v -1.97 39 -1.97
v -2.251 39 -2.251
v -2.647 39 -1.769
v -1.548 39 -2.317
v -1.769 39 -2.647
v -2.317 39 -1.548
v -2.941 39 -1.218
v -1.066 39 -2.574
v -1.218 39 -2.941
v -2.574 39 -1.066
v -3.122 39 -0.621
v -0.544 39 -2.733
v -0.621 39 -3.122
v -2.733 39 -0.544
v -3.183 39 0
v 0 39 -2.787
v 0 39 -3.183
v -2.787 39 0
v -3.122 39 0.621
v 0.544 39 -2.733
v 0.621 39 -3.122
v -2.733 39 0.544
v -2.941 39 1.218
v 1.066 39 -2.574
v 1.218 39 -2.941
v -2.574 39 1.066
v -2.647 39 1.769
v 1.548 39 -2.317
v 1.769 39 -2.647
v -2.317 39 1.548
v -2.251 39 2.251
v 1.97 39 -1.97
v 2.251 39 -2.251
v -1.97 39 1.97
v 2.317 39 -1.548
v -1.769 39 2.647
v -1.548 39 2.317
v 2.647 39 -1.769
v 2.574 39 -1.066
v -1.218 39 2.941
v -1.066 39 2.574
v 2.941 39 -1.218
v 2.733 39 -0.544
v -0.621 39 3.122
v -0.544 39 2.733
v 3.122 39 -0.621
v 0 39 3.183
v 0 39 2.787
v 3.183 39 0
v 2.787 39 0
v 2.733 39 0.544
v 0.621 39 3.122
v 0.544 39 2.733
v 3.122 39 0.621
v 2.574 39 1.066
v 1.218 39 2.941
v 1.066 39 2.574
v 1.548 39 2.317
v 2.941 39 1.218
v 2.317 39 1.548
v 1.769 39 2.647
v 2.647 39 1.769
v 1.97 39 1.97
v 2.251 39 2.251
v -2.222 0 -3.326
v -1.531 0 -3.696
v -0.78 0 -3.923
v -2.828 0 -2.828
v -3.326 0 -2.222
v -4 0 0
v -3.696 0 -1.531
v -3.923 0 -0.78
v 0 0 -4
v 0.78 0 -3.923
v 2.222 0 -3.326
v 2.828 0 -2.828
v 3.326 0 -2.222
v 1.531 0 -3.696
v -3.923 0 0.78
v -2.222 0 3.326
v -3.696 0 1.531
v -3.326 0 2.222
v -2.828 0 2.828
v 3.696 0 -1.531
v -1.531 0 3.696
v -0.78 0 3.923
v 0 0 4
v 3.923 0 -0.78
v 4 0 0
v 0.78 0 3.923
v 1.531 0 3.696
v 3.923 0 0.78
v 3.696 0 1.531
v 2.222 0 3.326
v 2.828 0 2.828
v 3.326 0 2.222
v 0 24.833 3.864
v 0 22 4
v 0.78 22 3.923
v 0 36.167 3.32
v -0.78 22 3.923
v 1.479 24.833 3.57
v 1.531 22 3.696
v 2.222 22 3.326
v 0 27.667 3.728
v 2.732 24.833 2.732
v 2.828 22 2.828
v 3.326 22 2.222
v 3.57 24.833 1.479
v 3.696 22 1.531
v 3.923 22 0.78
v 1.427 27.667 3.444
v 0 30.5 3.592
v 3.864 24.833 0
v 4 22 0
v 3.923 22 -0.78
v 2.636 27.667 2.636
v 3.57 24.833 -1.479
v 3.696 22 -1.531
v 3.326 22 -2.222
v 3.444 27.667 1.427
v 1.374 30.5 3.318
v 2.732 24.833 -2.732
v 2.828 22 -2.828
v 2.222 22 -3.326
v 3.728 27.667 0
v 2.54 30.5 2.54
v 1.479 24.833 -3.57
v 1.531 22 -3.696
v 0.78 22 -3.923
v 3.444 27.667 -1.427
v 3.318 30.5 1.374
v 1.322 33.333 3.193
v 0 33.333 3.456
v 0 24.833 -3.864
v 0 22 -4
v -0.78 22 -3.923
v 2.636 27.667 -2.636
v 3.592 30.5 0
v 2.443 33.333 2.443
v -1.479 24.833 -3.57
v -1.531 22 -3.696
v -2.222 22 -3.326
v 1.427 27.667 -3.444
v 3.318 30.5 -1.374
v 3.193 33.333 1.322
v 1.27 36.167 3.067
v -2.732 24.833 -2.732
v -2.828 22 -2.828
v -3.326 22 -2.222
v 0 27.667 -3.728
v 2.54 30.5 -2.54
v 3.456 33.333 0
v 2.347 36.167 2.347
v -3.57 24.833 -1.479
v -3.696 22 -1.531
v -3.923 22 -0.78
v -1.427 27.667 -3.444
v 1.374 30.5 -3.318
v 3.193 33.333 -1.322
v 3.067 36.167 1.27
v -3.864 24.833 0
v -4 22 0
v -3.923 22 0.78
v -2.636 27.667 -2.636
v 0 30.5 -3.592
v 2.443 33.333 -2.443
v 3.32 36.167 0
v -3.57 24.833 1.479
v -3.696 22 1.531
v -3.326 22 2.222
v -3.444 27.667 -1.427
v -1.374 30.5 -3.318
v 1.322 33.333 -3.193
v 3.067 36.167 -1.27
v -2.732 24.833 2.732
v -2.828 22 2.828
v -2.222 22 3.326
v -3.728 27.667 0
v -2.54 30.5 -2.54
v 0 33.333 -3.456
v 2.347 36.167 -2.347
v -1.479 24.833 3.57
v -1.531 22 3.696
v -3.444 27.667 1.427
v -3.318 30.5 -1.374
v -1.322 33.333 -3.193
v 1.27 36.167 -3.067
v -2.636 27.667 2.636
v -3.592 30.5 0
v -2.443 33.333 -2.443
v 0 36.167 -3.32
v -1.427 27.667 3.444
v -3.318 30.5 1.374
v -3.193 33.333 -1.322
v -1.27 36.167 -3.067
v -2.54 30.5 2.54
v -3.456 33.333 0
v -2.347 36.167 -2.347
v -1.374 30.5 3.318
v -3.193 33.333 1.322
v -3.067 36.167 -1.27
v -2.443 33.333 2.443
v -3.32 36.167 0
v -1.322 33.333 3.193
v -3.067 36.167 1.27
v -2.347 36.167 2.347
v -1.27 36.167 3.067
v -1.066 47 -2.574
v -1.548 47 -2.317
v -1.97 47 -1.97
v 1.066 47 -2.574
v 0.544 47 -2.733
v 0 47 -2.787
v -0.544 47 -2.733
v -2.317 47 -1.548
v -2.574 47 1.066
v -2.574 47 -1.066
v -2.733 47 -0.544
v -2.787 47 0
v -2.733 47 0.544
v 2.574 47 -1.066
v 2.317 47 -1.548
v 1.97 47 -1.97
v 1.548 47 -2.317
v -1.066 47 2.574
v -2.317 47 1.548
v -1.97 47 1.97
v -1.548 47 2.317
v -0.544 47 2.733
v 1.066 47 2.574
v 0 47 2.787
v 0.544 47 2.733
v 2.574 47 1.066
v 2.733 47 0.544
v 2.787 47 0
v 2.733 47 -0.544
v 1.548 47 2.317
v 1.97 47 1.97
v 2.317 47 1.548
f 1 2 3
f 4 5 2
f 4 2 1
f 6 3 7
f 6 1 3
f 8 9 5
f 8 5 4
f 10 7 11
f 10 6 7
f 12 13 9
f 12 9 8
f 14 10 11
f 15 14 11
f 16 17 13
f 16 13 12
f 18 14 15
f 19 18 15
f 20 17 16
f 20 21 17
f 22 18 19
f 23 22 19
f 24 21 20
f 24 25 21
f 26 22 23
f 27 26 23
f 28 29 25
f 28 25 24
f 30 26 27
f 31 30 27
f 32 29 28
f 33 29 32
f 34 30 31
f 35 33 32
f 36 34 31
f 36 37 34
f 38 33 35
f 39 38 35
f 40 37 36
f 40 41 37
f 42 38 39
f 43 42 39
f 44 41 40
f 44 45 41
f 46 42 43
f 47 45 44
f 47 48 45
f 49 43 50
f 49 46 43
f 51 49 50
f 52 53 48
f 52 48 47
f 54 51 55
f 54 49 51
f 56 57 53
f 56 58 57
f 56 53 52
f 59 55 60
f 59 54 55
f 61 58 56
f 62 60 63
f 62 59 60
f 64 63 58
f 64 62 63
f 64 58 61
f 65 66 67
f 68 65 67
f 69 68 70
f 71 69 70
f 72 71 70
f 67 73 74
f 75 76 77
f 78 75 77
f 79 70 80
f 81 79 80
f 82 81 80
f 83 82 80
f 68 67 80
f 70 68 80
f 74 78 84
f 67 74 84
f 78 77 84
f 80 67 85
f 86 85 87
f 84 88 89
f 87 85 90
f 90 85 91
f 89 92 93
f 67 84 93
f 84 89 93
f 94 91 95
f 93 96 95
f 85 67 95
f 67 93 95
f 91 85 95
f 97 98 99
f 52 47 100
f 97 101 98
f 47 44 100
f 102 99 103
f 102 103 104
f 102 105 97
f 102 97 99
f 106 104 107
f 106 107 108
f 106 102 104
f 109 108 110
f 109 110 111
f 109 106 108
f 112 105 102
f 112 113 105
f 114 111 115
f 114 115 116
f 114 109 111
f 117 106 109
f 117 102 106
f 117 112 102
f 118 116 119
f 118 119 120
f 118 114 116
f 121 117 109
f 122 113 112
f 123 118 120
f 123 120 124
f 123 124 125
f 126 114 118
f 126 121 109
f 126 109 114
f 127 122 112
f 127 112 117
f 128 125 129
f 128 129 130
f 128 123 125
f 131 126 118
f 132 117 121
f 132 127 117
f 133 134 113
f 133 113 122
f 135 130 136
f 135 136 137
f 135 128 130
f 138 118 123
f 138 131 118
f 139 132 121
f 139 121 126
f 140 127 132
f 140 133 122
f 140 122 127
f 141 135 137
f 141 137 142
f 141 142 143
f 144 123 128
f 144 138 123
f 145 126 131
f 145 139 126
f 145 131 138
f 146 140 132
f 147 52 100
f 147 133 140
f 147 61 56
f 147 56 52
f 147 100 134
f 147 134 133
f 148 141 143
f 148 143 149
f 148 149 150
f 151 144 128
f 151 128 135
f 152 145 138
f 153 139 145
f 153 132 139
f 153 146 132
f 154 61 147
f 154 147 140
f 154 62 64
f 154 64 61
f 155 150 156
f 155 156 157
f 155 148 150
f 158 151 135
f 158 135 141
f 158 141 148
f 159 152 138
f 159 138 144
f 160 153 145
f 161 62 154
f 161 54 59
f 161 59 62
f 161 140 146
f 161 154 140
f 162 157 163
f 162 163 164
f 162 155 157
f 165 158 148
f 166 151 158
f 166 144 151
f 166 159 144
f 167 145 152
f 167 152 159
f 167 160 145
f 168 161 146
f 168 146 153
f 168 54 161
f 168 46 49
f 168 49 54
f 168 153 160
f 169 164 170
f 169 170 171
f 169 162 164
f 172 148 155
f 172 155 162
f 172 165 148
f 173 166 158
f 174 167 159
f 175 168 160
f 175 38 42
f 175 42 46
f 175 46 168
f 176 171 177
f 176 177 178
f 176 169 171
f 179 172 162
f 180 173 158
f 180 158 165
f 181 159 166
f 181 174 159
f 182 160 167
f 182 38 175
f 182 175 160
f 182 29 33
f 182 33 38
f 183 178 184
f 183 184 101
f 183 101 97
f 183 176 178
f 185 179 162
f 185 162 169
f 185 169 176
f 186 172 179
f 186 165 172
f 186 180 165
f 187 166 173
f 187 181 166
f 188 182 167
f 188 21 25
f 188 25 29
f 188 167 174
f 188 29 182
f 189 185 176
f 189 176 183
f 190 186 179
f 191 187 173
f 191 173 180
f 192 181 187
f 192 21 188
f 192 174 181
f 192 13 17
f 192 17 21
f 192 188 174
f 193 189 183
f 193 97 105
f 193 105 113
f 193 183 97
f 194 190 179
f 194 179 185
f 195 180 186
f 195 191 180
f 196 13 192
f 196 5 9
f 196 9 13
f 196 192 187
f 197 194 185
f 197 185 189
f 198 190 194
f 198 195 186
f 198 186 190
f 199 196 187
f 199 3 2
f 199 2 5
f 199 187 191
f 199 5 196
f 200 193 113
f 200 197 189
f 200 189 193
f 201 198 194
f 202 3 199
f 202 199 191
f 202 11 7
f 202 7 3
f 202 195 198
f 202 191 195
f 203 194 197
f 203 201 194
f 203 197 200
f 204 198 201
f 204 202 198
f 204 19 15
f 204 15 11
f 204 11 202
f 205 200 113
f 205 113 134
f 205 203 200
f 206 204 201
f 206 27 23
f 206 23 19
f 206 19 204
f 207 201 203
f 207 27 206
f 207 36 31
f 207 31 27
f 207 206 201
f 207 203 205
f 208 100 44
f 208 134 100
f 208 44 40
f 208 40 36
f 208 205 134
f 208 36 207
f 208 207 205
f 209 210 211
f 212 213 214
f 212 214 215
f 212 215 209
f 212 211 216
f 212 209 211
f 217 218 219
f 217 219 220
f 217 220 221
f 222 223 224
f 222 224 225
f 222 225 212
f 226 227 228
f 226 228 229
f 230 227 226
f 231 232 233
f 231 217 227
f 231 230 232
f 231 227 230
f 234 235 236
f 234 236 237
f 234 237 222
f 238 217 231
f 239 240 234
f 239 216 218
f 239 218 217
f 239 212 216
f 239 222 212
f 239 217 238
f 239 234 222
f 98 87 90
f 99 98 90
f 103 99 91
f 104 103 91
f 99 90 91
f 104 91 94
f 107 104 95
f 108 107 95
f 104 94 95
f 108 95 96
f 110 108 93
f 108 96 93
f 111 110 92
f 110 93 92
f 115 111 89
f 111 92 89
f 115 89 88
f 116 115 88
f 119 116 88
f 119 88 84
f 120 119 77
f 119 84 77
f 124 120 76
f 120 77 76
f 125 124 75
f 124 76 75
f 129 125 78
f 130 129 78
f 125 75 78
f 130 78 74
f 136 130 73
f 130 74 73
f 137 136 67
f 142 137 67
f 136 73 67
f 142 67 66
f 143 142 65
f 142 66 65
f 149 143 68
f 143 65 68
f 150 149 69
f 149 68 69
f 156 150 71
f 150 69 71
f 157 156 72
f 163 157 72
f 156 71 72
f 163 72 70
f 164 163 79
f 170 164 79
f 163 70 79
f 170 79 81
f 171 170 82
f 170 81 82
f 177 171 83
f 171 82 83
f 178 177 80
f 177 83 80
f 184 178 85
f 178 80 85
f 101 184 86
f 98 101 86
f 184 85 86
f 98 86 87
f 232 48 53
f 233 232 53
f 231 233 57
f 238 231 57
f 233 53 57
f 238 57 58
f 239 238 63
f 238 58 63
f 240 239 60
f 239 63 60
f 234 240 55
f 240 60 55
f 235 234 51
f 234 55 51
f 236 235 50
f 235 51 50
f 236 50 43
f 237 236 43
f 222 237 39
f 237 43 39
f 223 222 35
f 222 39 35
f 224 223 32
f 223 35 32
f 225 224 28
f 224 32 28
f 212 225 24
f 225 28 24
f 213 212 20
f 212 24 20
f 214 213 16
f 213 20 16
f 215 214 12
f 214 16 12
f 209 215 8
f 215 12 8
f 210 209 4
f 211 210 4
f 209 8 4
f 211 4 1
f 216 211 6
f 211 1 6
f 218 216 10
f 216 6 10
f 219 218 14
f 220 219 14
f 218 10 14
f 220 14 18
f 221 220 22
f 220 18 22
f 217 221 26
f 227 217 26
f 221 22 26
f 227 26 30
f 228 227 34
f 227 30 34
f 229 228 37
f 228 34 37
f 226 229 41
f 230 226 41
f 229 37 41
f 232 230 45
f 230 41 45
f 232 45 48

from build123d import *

# Parameters (mm, degrees)
SKETCH1_R           = 4
BOSS_EXTRUDE1_DEPTH = 22
SKETCH2_R           = 4
BOSS_EXTRUDE2_DEPTH = 17
BOSS_EXTRUDE2_TAPER = 2.75
SKETCH3_R           = 2.786556444
BOSS_EXTRUDE3_DEPTH = 8


with BuildPart() as part:
    # Sketch1 → Boss-Extrude1 (new body)
    with BuildSketch(Plane(origin=(0, 0, 0), x_dir=(1, 0, 0), z_dir=(0, 1, 0))):
        with Locations(Location((0, 0, 0), (0, 0, 270))):
            Circle(SKETCH1_R)
    extrude(amount=BOSS_EXTRUDE1_DEPTH)

    # Sketch2 → Boss-Extrude2 (add)
    with BuildSketch(Plane(origin=(0, 22, 0), x_dir=(1, 0, 0), z_dir=(0, 1, 0))):
        with Locations(Location((0, 0, 0), (0, 0, 270))):
            Circle(SKETCH2_R)
    extrude(amount=BOSS_EXTRUDE2_DEPTH, taper=BOSS_EXTRUDE2_TAPER)

    # Sketch3 → Boss-Extrude3 (add)
    with BuildSketch(Plane(origin=(0, 39, 0), x_dir=(1, 0, 0), z_dir=(0, 1, 0))):
        with Locations(Location((0, 0, 0), (0, 0, 270))):
            Circle(SKETCH3_R)
    extrude(amount=BOSS_EXTRUDE3_DEPTH)


solid = part.part
